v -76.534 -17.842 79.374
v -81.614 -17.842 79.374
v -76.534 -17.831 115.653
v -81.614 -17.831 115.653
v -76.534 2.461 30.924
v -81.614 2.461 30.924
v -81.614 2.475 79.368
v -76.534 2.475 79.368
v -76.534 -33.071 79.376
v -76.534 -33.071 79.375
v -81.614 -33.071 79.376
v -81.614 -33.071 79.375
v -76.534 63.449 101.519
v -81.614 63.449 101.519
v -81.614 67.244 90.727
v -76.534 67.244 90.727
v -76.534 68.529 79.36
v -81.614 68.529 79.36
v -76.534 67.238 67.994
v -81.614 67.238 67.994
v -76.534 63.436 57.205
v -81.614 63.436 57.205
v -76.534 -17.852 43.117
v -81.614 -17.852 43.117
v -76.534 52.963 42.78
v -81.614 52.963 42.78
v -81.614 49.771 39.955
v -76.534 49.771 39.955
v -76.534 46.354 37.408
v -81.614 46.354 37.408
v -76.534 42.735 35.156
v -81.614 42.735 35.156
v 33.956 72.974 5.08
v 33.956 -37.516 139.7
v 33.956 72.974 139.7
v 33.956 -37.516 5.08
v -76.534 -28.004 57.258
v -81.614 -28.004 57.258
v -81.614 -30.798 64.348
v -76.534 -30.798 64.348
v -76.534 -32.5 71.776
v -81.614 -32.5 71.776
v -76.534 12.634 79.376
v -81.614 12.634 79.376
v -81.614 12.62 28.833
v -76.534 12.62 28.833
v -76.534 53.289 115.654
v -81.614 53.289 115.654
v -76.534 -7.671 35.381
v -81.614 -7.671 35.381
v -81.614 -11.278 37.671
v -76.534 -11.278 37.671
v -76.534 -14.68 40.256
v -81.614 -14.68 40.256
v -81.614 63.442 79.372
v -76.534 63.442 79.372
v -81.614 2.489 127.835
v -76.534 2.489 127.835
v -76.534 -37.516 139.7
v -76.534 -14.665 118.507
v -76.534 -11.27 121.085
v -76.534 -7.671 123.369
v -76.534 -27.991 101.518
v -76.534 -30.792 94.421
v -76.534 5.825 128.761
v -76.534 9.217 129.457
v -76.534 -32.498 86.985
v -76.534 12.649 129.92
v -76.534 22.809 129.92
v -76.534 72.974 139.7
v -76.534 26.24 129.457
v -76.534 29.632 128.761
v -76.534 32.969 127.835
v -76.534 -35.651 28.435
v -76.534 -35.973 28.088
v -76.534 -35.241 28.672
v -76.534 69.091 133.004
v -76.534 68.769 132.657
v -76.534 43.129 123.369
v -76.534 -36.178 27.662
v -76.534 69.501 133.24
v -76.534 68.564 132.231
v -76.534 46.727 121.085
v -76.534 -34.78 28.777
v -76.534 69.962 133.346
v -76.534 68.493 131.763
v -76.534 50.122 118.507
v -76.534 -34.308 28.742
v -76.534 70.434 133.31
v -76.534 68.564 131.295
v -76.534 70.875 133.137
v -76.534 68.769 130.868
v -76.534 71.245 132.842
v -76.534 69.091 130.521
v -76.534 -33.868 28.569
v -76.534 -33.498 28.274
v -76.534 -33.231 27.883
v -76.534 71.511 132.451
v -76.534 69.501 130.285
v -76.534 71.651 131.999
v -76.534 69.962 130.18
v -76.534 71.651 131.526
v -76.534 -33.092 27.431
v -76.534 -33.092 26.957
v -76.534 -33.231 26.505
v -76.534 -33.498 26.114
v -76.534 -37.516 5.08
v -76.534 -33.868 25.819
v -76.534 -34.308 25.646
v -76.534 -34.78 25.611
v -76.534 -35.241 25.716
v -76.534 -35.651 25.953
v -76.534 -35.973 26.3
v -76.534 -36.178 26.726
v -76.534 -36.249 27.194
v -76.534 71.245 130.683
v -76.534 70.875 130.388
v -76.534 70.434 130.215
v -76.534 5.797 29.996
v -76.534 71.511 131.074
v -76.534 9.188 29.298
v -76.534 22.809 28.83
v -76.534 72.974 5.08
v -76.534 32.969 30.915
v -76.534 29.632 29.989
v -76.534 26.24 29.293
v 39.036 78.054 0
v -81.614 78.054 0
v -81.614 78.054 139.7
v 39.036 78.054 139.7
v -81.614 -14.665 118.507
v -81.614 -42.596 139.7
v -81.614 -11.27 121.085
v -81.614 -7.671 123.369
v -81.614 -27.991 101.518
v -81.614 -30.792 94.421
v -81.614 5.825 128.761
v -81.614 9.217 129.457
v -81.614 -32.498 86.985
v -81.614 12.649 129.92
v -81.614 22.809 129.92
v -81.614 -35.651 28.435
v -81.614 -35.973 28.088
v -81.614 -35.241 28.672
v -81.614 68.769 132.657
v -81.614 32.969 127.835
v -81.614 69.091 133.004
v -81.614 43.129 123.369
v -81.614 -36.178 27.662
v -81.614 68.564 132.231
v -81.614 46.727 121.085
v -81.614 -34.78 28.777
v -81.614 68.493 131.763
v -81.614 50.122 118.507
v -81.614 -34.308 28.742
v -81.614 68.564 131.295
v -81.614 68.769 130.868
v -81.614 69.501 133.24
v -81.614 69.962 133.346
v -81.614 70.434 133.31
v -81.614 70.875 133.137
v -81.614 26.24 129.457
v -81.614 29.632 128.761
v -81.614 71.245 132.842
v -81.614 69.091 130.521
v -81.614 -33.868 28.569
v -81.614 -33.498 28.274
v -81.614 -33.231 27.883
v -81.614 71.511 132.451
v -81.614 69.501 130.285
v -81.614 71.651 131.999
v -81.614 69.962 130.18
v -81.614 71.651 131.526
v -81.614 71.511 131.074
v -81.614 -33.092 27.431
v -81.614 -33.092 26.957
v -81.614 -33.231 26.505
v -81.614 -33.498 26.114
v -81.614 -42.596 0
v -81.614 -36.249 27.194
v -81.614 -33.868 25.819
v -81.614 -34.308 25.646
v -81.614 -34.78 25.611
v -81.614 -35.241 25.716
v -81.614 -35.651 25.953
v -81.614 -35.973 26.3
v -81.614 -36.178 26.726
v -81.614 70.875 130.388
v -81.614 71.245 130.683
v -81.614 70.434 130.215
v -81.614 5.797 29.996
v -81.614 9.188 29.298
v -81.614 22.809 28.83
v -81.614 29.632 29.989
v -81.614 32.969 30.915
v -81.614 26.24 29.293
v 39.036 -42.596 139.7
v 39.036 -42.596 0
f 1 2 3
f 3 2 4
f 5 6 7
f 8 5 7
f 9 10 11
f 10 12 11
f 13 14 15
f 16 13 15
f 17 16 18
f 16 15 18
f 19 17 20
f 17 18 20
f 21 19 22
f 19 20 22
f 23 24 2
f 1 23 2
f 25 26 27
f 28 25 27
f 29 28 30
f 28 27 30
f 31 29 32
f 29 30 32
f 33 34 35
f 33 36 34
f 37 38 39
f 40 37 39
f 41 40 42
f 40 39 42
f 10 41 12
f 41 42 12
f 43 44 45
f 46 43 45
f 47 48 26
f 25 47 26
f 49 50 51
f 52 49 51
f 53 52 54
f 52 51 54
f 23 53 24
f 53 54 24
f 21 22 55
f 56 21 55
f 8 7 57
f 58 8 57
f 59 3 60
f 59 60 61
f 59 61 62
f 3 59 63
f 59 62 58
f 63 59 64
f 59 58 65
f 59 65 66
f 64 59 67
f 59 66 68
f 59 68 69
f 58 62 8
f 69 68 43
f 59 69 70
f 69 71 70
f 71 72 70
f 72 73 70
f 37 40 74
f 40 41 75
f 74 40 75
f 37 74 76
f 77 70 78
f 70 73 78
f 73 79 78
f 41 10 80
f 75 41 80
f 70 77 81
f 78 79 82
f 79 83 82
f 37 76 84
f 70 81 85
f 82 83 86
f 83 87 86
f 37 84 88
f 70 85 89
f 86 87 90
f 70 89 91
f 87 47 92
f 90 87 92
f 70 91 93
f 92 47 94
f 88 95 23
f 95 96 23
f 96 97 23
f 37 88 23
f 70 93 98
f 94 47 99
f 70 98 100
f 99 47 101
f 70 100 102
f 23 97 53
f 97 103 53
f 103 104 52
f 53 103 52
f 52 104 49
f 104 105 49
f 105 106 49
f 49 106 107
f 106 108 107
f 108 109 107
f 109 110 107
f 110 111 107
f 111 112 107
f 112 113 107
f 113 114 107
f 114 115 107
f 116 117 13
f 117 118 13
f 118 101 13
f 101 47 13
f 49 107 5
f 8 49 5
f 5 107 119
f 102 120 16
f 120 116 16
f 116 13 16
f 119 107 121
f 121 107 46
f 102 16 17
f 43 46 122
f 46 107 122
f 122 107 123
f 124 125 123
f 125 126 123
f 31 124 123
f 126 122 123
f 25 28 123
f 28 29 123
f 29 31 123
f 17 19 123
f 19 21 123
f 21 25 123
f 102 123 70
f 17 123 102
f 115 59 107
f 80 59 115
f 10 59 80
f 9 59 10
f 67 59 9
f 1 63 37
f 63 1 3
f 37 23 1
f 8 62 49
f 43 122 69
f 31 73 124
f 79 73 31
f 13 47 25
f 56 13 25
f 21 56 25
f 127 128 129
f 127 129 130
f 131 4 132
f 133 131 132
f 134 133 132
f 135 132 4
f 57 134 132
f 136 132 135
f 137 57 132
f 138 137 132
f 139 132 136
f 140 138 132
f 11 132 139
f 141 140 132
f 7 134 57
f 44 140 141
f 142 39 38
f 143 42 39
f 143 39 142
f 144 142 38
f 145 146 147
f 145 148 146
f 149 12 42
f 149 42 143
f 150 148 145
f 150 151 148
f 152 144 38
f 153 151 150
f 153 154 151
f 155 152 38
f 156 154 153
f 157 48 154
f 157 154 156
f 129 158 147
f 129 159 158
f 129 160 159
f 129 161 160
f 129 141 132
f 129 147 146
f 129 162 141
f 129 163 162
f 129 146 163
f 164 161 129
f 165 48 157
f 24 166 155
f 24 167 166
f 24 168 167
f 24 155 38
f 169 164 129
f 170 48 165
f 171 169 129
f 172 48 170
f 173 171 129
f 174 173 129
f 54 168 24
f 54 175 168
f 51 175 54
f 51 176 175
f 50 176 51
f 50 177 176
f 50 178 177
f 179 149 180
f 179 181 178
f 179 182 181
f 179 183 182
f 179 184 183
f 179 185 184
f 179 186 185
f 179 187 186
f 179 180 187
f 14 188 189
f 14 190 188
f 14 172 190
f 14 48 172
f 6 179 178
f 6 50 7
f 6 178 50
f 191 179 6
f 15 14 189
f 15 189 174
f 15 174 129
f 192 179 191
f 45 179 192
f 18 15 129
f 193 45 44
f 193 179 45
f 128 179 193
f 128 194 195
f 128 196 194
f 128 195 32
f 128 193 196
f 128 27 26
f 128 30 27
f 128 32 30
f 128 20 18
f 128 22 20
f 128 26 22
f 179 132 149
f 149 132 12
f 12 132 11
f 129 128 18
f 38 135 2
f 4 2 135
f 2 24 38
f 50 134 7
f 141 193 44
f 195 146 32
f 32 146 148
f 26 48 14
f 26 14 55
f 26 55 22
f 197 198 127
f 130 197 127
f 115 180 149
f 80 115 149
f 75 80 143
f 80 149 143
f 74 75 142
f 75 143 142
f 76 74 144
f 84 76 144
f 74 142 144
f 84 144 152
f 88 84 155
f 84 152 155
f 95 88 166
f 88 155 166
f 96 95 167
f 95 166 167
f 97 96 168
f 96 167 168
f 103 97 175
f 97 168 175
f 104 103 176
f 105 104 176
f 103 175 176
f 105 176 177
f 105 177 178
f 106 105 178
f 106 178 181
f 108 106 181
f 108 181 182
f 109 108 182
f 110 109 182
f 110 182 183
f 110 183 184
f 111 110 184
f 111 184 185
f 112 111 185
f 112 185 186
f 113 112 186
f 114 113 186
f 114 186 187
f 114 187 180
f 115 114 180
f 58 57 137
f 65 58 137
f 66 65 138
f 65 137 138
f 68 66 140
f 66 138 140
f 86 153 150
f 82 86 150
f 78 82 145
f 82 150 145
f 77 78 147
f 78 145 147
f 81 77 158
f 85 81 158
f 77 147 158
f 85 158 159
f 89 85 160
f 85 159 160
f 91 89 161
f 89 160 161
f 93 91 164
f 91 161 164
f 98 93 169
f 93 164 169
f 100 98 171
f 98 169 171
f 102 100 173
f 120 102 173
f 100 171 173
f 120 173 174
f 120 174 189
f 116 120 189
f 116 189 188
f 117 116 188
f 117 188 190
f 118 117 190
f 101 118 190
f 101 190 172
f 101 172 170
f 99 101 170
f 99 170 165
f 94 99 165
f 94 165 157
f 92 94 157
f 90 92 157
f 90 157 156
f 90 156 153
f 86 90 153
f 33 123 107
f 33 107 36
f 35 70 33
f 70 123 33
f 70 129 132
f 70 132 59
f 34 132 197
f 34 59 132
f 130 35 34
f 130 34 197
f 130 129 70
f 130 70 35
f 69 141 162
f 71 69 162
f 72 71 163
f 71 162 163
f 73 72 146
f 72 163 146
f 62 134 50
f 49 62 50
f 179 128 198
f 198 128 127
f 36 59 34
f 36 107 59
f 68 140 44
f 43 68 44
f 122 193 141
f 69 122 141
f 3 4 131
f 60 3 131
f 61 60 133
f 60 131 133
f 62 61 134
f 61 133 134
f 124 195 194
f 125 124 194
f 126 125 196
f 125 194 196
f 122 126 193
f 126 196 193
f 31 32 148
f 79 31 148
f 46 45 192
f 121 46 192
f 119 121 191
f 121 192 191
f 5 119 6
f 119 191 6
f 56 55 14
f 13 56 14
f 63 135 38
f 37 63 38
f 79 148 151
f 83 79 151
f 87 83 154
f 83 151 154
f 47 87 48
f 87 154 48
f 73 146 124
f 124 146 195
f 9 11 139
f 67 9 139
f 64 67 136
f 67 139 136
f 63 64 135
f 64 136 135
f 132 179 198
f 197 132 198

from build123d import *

# Parameters (mm, degrees)
F0_W     = 120.65
F0_H     = 120.65
F1_DEPTH = 139.7
F2_T     = -5.08
F4_DEPTH = 25.4
F5_R     = 1.5875
F6_DEPTH = 25.4


with BuildPart() as f1:
    # F0 (on Top) → F1 (new body)
    with BuildSketch(Plane.XY):
        with Locations((-21.288729769, 17.728820008)):
            Rectangle(F0_W, F0_H)
    extrude(amount=F1_DEPTH)

    # F2
    f2_openings = [f1.faces().sort_by_distance(p)[0] for p in [
        (-21.28873, 17.72882, 139.7),
    ]]
    offset(amount=F2_T, openings=f2_openings)

    # F3 (on face) → F4 (cut)
    with BuildSketch(Plane(origin=(-81.613729769, 0, 0), x_dir=(0, -1, 0), z_dir=(-1, 0, 0))):
        with BuildLine():
            Line((-22.8087121331, 79.4233293937), (-22.8087121331, 129.9203726467))
            ThreePointArc((-22.8087121331, 129.9203726467), (-27.9420685988, 129.1377325739), (-32.9687117108, 127.8351454898))
            Line((-32.9687117108, 127.8351454898), (-32.9687117108, 79.4203999617))
            Line((-32.9687117108, 79.4203999617), (-22.8087121331, 79.4233293937))
        make_face()
        with BuildLine():
            ThreePointArc((-32.9687117108, 30.9148545102), (-27.9420685988, 29.6122674261), (-22.8087121331, 28.8296273533))
            Line((-22.8087121331, 28.8296273533), (-22.8087121331, 79.4233293937))
            Line((-22.8087121331, 79.4233293937), (-32.9687117108, 79.4203999617))
            Line((-32.9687117108, 79.4203999617), (-32.9687117108, 30.9148545102))
        make_face()
        with BuildLine():
            ThreePointArc((-12.6196735848, 28.8325760096), (-7.486767718, 29.618187754), (-2.4608762974, 30.9236853135))
            Line((-2.4608762974, 30.9236853135), (-2.4748441512, 79.3676804493))
            Line((-2.4748441512, 79.3676804493), (-2.4888187622, 79.36767642))
            Line((-2.4888187622, 79.36767642), (-12.6342468971, 79.3764521102))
            Line((-12.6342468971, 79.3764521102), (-12.6196735848, 28.8325760096))
        make_face()
        with BuildLine():
            Line((-2.4748441512, 79.3676804493), (-2.4888187622, 127.8351110402))
            ThreePointArc((-2.4888187622, 127.8351110402), (-7.5154621752, 129.1377101531), (-12.6488202192, 129.9203618262))
            Line((-12.6488202192, 129.9203618262), (-12.6342468971, 79.3764521102))
            Line((-12.6342468971, 79.3764521102), (-2.4888187622, 79.36767642))
            Line((-2.4888187622, 79.36767642), (-2.4748441512, 79.3676804493))
        make_face()
        with BuildLine():
            Line((17.8416409794, 79.3735383001), (17.8311803932, 115.6534560237))
            ThreePointArc((17.8311803932, 115.6534560237), (12.9943502285, 119.8314804526), (7.6711808155, 123.3690900368))
            Line((7.6711808155, 123.3690900368), (7.6711808155, 79.370605852))
            Line((7.6711808155, 79.370605852), (17.8311803932, 79.373535284))
            Line((17.8311803932, 79.373535284), (17.8416409794, 79.3735383001))
        make_face()
        with BuildLine():
            ThreePointArc((7.6711808155, 35.3809099632), (13.0060137652, 38.9273796382), (17.8520948084, 43.1170560315))
            Line((17.8520948084, 43.1170560315), (17.8416409794, 79.3735383001))
            Line((17.8416409794, 79.3735383001), (17.8311803932, 79.373535284))
            Line((17.8311803932, 79.373535284), (7.6711808155, 79.370605852))
            Line((7.6711808155, 79.370605852), (7.6711808155, 35.3809099632))
        make_face()
        with BuildLine():
            Line((27.9975640978, 79.376464716), (33.0711799708, 79.376464716))
            ThreePointArc((33.0711799708, 79.376464716), (31.7847314928, 90.7349391624), (27.9911799708, 101.5182066768))
            Line((27.9911799708, 101.5182066768), (27.9975640978, 79.376464716))
        make_face()
        with BuildLine():
            ThreePointArc((28.0039414666, 57.2581618917), (31.7881684046, 68.0300514084), (33.071179992, 79.375))
            ThreePointArc((33.071179992, 79.375), (33.0711799867, 79.375732358), (33.0711799708, 79.376464716))
            Line((33.0711799708, 79.376464716), (27.9975640978, 79.376464716))
            Line((27.9975640978, 79.376464716), (28.0039414666, 57.2581618917))
        make_face()
        with BuildLine():
            Line((-42.9323247395, 79.4203999617), (-43.1287117108, 123.3691530375))
            ThreePointArc((-43.1287117108, 123.3691530375), (-48.4518229046, 119.8316075323), (-53.2886102754, 115.6536619949))
            Line((-53.2886102754, 115.6536619949), (-53.1265006866, 79.375724394))
            Line((-53.1265006866, 79.375724394), (-43.1287117108, 79.4203999617))
            Line((-43.1287117108, 79.4203999617), (-42.9323247395, 79.4203999617))
        make_face()
        with BuildLine():
            ThreePointArc((-52.962971018, 42.7799921081), (-48.0890388763, 38.6454393558), (-42.7345255311, 35.155607294))
            Line((-42.7345255311, 35.155607294), (-42.9323247395, 79.4203999617))
            Line((-42.9323247395, 79.4203999617), (-43.1287117108, 79.4203999617))
            Line((-43.1287117108, 79.4203999617), (-53.1265006866, 79.375724394))
            Line((-53.1265006866, 79.375724394), (-52.962971018, 42.7799921081))
        make_face()
        with BuildLine():
            Line((-63.4422243346, 79.3720724091), (-63.4486098531, 101.5186405436))
            ThreePointArc((-63.4486098531, 101.5186405436), (-67.2429726273, 90.732318803), (-68.528819818, 79.3706057914))
            Line((-68.528819818, 79.3706057914), (-63.4486098531, 79.372070568))
            Line((-63.4486098531, 79.372070568), (-63.4422243346, 79.3720724091))
        make_face()
        with BuildLine():
            ThreePointArc((-68.528819818, 79.3706057914), (-67.2387120843, 67.9991226008), (-63.4358329036, 57.2049983725))
            Line((-63.4358329036, 57.2049983725), (-63.4422243346, 79.3720724091))
            Line((-63.4422243346, 79.3720724091), (-63.4486098531, 79.372070568))
            Line((-63.4486098531, 79.372070568), (-68.528819818, 79.3706057914))
        make_face()
    extrude(amount=-F4_DEPTH, mode=Mode.SUBTRACT)

    # F5 (on face) → F6 (cut)
    with BuildSketch(Plane(origin=(-81.613729769, 0, 0), x_dir=(0, -1, 0), z_dir=(-1, 0, 0))):
        with Locations((34.6613678069, 27.1940474238)):
            Circle(F5_R)
        with Locations((-70.0808512879, 131.7625792464)):
            Circle(F5_R)
    extrude(amount=-F6_DEPTH, mode=Mode.SUBTRACT)


solid = f1.part
